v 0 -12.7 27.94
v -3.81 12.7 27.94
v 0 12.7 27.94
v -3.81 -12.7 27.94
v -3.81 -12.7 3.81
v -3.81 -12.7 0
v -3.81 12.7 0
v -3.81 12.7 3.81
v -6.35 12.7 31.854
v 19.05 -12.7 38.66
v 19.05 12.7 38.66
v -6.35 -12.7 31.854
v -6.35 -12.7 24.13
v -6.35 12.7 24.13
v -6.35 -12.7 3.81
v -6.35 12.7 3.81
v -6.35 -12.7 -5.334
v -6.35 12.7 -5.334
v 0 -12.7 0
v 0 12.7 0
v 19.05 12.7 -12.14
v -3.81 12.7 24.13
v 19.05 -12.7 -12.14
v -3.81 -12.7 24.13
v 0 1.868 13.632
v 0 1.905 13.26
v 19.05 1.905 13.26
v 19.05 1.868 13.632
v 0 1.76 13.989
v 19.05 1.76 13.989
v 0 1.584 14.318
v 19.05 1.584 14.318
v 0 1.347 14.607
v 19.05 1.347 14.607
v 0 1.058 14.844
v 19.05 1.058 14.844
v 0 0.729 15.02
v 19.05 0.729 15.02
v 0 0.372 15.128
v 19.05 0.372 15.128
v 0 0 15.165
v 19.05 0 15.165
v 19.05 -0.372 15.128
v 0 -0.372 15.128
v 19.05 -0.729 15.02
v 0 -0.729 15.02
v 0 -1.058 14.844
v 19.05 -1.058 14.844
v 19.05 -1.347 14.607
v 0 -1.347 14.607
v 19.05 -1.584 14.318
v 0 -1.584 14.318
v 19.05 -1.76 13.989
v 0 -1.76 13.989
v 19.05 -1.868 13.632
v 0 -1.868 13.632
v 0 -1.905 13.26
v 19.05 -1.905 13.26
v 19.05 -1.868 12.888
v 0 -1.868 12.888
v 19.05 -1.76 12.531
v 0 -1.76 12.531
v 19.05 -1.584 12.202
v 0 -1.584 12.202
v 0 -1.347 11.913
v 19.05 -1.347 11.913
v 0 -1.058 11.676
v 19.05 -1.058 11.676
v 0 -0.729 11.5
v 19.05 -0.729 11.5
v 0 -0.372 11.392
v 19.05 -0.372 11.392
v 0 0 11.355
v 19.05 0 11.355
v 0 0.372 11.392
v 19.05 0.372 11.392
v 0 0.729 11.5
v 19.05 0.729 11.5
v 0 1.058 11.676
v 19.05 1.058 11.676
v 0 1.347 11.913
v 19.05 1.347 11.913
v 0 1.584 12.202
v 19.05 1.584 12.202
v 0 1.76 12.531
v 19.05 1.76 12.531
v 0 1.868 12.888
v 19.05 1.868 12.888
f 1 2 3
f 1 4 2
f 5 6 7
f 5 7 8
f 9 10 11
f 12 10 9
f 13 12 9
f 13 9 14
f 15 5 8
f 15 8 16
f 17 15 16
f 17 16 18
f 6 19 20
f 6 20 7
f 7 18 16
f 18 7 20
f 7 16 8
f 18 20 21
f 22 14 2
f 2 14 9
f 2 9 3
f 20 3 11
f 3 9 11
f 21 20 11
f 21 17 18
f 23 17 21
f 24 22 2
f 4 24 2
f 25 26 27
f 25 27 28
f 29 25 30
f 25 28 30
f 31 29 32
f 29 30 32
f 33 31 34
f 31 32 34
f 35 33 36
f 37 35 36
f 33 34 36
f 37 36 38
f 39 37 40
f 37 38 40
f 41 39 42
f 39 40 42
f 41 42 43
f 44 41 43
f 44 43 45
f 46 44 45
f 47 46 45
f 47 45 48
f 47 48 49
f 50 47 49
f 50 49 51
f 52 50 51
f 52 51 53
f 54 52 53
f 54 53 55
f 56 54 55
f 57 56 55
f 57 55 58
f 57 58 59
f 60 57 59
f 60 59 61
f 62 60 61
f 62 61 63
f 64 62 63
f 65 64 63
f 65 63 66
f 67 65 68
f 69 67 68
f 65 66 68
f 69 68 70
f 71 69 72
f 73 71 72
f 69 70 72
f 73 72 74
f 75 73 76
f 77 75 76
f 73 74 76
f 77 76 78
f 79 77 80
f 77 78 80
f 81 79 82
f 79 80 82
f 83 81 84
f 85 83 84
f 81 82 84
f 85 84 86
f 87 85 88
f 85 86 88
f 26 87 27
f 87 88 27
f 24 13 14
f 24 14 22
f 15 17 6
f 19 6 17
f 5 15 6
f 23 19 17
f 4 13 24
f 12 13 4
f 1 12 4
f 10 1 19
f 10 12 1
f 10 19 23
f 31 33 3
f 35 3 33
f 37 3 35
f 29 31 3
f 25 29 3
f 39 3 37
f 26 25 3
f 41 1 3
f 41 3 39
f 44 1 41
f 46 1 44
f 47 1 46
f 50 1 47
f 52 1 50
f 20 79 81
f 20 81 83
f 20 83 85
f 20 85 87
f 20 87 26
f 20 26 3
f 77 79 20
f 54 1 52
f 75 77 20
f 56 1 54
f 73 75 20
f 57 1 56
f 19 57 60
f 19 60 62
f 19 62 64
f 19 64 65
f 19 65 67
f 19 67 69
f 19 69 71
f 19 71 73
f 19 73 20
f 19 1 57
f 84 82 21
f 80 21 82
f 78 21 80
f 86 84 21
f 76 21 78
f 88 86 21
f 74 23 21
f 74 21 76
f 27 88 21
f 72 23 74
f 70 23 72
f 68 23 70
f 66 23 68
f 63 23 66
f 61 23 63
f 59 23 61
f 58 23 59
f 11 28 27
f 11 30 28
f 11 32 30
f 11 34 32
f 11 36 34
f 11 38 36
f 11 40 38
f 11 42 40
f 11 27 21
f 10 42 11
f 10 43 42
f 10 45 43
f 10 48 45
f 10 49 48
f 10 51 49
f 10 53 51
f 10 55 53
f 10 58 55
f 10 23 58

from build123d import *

# Parameters (mm, degrees)
F1_DEPTH = 12.7
F3_D     = 3.81


with BuildPart() as f1:
    # F0 (on Front) → F1 (new body, symmetric)
    with BuildSketch(Plane.XZ):
        Polygon((0, 27.94), (0, 0), (-3.81, 0), (-3.81, 3.81), (-6.35, 3.81), (-6.35, -5.334), (19.05, -12.139909), (19.05, 38.660091), (-6.35, 31.854181), (-6.35, 24.13), (-3.81, 24.13), (-3.81, 27.94), align=None)
    extrude(amount=F1_DEPTH, both=True)

    # F3 (through all)
    with Locations(Plane(origin=(0, 0, 0), x_dir=(0, -1, 0), z_dir=(-1, 0, 0))):
        with Locations((0, 13.260091)):
            Hole(F3_D / 2)


solid = f1.part
